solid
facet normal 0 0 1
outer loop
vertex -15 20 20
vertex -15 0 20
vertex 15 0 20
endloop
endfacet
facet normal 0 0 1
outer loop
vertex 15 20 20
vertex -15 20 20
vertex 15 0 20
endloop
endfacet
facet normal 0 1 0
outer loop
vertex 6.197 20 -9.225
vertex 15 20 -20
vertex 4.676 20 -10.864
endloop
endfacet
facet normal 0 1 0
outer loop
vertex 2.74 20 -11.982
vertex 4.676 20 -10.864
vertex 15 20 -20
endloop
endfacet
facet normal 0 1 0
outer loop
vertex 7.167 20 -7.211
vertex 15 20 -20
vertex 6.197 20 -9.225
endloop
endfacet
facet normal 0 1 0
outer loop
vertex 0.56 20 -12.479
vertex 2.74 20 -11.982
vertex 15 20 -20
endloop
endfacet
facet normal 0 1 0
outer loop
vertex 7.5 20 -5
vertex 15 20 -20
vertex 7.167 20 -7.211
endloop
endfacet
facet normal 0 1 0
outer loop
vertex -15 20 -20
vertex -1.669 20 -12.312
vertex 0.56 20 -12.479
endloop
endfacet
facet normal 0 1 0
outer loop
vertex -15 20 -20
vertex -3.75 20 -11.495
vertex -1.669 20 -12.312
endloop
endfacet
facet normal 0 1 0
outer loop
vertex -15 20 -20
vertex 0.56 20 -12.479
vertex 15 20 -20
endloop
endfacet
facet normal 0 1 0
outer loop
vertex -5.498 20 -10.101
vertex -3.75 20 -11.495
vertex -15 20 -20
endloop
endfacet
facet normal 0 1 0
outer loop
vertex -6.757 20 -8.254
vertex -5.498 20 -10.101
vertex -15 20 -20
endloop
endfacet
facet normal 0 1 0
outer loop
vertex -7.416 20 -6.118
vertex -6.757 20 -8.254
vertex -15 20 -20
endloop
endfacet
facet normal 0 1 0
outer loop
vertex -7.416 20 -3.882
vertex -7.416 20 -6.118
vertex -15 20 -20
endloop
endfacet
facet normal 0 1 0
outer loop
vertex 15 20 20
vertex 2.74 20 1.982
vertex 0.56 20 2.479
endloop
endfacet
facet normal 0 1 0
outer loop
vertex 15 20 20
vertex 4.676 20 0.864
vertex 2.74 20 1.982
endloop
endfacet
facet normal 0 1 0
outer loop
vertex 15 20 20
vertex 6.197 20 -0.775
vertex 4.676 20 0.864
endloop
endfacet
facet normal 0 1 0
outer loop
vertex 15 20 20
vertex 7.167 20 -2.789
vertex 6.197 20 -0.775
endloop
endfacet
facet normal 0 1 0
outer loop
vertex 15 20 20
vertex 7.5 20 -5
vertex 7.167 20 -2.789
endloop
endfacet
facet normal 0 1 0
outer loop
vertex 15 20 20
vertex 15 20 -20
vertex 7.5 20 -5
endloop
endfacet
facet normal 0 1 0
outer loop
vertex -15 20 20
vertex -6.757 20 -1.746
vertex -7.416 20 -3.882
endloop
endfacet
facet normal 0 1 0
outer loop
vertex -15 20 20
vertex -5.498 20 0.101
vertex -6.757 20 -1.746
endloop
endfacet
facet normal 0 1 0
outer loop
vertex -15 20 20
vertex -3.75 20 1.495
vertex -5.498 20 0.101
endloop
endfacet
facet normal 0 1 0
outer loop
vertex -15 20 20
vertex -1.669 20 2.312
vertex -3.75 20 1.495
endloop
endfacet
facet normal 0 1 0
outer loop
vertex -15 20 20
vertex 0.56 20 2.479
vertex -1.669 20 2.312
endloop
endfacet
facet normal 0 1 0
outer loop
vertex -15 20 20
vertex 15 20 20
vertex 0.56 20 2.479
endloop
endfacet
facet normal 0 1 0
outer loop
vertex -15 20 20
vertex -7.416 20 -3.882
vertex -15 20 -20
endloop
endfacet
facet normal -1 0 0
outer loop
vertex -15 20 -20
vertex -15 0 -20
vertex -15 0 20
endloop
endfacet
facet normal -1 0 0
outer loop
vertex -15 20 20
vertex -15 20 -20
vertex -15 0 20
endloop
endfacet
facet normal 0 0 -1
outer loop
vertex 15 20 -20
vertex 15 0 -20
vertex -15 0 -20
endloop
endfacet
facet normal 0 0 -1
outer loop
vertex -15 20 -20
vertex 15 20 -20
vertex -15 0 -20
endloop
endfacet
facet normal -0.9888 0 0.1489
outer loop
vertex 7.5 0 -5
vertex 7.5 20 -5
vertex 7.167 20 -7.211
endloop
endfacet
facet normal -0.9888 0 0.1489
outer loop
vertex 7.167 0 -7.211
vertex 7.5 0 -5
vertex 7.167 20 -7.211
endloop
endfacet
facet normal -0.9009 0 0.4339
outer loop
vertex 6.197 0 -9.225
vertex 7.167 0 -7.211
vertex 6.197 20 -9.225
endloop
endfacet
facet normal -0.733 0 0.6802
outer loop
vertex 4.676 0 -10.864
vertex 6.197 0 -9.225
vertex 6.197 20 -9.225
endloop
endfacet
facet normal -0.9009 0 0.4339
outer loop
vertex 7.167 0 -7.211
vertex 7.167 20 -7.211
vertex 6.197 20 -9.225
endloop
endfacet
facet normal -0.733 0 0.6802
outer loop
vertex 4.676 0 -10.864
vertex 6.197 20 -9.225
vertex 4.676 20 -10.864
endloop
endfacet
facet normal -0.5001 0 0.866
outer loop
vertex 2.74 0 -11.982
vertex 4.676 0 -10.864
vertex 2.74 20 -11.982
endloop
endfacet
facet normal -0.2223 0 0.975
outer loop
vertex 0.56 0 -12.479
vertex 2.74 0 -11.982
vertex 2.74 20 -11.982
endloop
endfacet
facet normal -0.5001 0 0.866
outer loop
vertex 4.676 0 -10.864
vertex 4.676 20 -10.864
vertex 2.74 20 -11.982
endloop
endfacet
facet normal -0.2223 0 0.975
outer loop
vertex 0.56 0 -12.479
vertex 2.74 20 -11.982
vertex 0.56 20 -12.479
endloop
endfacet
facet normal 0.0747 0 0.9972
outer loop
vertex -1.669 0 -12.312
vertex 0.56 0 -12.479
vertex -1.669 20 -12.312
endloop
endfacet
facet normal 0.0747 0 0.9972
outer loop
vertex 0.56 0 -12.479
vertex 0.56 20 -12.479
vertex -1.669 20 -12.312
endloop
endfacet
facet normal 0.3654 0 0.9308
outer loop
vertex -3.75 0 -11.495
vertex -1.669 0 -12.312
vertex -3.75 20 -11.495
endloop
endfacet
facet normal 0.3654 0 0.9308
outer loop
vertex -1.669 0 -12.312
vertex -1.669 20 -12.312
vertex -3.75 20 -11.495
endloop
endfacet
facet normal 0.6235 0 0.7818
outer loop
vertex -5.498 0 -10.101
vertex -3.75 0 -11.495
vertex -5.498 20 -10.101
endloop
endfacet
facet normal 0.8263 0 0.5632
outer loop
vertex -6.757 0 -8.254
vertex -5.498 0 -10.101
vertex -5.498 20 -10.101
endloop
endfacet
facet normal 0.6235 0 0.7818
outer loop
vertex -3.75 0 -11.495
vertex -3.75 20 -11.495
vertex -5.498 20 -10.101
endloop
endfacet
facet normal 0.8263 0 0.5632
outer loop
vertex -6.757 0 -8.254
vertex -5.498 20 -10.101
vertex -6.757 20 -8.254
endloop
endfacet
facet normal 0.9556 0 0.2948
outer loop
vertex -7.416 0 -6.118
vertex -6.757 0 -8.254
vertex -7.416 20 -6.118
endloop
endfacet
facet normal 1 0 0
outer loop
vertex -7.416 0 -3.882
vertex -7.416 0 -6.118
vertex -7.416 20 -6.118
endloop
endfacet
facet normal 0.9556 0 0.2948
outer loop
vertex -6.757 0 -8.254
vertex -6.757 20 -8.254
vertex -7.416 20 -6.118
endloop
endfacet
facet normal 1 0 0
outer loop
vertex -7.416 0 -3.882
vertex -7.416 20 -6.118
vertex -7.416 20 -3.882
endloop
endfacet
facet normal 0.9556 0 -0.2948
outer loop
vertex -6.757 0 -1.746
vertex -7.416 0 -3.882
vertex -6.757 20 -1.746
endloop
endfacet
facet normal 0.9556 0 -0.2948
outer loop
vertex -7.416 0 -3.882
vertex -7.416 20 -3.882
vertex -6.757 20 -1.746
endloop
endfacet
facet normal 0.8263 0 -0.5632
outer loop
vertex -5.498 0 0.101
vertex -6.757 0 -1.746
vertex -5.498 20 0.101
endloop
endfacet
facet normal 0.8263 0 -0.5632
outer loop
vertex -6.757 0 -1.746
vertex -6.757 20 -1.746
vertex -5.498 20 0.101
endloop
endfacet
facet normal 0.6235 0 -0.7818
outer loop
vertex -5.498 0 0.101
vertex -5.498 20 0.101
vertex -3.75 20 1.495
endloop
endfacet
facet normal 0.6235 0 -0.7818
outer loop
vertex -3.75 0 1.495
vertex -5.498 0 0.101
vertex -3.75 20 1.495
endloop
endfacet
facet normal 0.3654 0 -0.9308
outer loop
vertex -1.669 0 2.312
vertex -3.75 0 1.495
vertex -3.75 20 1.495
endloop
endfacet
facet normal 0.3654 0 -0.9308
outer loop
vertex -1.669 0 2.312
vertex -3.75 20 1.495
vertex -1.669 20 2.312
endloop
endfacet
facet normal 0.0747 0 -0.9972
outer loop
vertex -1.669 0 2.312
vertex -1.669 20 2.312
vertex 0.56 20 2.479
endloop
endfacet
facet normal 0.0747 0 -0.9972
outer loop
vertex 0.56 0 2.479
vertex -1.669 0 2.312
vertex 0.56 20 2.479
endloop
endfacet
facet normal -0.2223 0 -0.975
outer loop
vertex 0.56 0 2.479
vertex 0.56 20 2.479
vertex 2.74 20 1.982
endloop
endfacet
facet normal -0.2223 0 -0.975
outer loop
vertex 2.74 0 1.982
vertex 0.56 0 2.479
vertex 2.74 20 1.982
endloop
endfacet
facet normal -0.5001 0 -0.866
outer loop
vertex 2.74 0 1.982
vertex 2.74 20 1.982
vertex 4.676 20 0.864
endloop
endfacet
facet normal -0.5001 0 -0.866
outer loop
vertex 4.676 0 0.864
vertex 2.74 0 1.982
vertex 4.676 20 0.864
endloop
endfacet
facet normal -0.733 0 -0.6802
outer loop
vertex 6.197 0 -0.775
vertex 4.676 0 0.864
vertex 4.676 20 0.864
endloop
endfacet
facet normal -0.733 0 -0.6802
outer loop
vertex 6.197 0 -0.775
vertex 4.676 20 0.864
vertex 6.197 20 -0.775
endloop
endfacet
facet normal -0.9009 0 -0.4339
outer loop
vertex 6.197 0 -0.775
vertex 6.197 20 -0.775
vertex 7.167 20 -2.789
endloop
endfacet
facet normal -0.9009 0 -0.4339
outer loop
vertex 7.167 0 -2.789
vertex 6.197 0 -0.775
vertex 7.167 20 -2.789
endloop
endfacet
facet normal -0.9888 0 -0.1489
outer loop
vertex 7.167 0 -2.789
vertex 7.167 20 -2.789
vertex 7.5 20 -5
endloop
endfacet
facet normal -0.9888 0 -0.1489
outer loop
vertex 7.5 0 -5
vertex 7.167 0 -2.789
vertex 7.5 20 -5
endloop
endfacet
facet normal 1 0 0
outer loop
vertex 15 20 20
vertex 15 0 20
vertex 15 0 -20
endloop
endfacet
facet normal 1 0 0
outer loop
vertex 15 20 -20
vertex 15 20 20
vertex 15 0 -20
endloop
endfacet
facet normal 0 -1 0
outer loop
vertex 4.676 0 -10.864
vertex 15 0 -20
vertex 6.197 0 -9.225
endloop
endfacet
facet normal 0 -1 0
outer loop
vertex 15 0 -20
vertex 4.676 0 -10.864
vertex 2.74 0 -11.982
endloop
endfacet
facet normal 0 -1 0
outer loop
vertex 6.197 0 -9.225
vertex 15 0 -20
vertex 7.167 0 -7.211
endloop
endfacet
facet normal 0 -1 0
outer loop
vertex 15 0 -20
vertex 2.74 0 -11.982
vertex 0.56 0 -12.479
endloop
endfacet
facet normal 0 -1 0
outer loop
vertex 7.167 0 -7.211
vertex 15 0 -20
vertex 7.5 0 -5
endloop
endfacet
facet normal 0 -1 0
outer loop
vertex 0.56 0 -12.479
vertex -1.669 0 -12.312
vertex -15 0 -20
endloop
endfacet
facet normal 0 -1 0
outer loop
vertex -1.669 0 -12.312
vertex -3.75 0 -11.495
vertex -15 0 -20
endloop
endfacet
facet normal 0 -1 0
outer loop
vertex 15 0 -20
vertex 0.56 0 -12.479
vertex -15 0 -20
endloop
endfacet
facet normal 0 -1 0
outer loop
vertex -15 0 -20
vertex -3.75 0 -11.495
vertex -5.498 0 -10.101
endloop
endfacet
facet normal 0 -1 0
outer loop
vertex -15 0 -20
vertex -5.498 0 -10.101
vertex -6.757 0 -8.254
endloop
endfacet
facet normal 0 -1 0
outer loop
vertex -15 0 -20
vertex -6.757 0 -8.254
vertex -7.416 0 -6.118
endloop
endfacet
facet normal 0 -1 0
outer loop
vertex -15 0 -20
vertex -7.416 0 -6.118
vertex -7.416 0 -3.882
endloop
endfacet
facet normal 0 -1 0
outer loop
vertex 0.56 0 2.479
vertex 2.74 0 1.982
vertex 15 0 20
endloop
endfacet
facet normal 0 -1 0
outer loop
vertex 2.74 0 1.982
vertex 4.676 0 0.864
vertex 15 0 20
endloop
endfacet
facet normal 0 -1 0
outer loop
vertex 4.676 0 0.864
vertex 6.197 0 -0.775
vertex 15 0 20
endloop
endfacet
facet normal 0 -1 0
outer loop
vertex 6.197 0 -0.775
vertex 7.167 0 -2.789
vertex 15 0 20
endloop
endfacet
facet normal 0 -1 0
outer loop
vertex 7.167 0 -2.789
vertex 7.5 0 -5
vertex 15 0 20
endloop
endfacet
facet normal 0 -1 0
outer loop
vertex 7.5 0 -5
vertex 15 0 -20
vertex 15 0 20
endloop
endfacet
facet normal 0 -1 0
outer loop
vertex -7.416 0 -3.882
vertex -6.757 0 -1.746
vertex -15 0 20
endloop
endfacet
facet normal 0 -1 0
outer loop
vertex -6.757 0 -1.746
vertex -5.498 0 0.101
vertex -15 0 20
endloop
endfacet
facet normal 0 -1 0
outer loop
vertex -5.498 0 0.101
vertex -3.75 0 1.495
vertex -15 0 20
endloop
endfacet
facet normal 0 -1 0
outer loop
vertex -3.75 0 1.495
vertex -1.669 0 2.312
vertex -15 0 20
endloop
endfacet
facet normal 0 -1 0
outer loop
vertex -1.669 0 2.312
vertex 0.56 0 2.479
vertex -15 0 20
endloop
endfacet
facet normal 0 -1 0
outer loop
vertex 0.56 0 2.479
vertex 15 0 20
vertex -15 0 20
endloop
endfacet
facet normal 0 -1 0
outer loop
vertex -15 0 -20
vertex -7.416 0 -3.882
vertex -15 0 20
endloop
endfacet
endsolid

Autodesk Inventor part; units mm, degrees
ref_plane "YZ Plane" through (0, 0, 0) normal (1, 0, 0) x (0, 1, 0)
ref_plane "XZ Plane" through (0, 0, 0) normal (0, 1, 0) x (-1, 0, 0)
ref_plane "XY Plane" through (0, 0, 0) normal (0, 0, 1) x (1, 0, 0)
sketch "Sketch1" plane through (0, 0, 0) normal (0, 1, 0) x (-1, 0, 0)
  line L0 (15, 20) -> (-15, 20)
  line L1 (-15, 20) -> (-15, -20)
  line L2 (-15, -20) -> (15, -20)
  line L3 (15, -20) -> (15, 20)
  point P0 (0, 0)
  point P1 (15, 0)
  point P2 (0, -20)
  dimension "d0" = 40
  dimension "d1" = 30
extrude "Extrusion1" add sketch "Sketch1" along normal blind 20
sketch "Sketch2" plane through (0, 20, 0) normal (0, 1, 0) x (1, 0, 0)
  circle A0 centre (0, 5) radius 7.5
  line L0 (15, 20) -> (-15, 20) projected
  point P0 (0, 0)
  point P1 (0, 20)
  dimension "d7" = 15
  dimension "d10" = 15
extrude "Extrusion2" cut sketch "Sketch2" against normal blind 20
properties part number "Slider"
